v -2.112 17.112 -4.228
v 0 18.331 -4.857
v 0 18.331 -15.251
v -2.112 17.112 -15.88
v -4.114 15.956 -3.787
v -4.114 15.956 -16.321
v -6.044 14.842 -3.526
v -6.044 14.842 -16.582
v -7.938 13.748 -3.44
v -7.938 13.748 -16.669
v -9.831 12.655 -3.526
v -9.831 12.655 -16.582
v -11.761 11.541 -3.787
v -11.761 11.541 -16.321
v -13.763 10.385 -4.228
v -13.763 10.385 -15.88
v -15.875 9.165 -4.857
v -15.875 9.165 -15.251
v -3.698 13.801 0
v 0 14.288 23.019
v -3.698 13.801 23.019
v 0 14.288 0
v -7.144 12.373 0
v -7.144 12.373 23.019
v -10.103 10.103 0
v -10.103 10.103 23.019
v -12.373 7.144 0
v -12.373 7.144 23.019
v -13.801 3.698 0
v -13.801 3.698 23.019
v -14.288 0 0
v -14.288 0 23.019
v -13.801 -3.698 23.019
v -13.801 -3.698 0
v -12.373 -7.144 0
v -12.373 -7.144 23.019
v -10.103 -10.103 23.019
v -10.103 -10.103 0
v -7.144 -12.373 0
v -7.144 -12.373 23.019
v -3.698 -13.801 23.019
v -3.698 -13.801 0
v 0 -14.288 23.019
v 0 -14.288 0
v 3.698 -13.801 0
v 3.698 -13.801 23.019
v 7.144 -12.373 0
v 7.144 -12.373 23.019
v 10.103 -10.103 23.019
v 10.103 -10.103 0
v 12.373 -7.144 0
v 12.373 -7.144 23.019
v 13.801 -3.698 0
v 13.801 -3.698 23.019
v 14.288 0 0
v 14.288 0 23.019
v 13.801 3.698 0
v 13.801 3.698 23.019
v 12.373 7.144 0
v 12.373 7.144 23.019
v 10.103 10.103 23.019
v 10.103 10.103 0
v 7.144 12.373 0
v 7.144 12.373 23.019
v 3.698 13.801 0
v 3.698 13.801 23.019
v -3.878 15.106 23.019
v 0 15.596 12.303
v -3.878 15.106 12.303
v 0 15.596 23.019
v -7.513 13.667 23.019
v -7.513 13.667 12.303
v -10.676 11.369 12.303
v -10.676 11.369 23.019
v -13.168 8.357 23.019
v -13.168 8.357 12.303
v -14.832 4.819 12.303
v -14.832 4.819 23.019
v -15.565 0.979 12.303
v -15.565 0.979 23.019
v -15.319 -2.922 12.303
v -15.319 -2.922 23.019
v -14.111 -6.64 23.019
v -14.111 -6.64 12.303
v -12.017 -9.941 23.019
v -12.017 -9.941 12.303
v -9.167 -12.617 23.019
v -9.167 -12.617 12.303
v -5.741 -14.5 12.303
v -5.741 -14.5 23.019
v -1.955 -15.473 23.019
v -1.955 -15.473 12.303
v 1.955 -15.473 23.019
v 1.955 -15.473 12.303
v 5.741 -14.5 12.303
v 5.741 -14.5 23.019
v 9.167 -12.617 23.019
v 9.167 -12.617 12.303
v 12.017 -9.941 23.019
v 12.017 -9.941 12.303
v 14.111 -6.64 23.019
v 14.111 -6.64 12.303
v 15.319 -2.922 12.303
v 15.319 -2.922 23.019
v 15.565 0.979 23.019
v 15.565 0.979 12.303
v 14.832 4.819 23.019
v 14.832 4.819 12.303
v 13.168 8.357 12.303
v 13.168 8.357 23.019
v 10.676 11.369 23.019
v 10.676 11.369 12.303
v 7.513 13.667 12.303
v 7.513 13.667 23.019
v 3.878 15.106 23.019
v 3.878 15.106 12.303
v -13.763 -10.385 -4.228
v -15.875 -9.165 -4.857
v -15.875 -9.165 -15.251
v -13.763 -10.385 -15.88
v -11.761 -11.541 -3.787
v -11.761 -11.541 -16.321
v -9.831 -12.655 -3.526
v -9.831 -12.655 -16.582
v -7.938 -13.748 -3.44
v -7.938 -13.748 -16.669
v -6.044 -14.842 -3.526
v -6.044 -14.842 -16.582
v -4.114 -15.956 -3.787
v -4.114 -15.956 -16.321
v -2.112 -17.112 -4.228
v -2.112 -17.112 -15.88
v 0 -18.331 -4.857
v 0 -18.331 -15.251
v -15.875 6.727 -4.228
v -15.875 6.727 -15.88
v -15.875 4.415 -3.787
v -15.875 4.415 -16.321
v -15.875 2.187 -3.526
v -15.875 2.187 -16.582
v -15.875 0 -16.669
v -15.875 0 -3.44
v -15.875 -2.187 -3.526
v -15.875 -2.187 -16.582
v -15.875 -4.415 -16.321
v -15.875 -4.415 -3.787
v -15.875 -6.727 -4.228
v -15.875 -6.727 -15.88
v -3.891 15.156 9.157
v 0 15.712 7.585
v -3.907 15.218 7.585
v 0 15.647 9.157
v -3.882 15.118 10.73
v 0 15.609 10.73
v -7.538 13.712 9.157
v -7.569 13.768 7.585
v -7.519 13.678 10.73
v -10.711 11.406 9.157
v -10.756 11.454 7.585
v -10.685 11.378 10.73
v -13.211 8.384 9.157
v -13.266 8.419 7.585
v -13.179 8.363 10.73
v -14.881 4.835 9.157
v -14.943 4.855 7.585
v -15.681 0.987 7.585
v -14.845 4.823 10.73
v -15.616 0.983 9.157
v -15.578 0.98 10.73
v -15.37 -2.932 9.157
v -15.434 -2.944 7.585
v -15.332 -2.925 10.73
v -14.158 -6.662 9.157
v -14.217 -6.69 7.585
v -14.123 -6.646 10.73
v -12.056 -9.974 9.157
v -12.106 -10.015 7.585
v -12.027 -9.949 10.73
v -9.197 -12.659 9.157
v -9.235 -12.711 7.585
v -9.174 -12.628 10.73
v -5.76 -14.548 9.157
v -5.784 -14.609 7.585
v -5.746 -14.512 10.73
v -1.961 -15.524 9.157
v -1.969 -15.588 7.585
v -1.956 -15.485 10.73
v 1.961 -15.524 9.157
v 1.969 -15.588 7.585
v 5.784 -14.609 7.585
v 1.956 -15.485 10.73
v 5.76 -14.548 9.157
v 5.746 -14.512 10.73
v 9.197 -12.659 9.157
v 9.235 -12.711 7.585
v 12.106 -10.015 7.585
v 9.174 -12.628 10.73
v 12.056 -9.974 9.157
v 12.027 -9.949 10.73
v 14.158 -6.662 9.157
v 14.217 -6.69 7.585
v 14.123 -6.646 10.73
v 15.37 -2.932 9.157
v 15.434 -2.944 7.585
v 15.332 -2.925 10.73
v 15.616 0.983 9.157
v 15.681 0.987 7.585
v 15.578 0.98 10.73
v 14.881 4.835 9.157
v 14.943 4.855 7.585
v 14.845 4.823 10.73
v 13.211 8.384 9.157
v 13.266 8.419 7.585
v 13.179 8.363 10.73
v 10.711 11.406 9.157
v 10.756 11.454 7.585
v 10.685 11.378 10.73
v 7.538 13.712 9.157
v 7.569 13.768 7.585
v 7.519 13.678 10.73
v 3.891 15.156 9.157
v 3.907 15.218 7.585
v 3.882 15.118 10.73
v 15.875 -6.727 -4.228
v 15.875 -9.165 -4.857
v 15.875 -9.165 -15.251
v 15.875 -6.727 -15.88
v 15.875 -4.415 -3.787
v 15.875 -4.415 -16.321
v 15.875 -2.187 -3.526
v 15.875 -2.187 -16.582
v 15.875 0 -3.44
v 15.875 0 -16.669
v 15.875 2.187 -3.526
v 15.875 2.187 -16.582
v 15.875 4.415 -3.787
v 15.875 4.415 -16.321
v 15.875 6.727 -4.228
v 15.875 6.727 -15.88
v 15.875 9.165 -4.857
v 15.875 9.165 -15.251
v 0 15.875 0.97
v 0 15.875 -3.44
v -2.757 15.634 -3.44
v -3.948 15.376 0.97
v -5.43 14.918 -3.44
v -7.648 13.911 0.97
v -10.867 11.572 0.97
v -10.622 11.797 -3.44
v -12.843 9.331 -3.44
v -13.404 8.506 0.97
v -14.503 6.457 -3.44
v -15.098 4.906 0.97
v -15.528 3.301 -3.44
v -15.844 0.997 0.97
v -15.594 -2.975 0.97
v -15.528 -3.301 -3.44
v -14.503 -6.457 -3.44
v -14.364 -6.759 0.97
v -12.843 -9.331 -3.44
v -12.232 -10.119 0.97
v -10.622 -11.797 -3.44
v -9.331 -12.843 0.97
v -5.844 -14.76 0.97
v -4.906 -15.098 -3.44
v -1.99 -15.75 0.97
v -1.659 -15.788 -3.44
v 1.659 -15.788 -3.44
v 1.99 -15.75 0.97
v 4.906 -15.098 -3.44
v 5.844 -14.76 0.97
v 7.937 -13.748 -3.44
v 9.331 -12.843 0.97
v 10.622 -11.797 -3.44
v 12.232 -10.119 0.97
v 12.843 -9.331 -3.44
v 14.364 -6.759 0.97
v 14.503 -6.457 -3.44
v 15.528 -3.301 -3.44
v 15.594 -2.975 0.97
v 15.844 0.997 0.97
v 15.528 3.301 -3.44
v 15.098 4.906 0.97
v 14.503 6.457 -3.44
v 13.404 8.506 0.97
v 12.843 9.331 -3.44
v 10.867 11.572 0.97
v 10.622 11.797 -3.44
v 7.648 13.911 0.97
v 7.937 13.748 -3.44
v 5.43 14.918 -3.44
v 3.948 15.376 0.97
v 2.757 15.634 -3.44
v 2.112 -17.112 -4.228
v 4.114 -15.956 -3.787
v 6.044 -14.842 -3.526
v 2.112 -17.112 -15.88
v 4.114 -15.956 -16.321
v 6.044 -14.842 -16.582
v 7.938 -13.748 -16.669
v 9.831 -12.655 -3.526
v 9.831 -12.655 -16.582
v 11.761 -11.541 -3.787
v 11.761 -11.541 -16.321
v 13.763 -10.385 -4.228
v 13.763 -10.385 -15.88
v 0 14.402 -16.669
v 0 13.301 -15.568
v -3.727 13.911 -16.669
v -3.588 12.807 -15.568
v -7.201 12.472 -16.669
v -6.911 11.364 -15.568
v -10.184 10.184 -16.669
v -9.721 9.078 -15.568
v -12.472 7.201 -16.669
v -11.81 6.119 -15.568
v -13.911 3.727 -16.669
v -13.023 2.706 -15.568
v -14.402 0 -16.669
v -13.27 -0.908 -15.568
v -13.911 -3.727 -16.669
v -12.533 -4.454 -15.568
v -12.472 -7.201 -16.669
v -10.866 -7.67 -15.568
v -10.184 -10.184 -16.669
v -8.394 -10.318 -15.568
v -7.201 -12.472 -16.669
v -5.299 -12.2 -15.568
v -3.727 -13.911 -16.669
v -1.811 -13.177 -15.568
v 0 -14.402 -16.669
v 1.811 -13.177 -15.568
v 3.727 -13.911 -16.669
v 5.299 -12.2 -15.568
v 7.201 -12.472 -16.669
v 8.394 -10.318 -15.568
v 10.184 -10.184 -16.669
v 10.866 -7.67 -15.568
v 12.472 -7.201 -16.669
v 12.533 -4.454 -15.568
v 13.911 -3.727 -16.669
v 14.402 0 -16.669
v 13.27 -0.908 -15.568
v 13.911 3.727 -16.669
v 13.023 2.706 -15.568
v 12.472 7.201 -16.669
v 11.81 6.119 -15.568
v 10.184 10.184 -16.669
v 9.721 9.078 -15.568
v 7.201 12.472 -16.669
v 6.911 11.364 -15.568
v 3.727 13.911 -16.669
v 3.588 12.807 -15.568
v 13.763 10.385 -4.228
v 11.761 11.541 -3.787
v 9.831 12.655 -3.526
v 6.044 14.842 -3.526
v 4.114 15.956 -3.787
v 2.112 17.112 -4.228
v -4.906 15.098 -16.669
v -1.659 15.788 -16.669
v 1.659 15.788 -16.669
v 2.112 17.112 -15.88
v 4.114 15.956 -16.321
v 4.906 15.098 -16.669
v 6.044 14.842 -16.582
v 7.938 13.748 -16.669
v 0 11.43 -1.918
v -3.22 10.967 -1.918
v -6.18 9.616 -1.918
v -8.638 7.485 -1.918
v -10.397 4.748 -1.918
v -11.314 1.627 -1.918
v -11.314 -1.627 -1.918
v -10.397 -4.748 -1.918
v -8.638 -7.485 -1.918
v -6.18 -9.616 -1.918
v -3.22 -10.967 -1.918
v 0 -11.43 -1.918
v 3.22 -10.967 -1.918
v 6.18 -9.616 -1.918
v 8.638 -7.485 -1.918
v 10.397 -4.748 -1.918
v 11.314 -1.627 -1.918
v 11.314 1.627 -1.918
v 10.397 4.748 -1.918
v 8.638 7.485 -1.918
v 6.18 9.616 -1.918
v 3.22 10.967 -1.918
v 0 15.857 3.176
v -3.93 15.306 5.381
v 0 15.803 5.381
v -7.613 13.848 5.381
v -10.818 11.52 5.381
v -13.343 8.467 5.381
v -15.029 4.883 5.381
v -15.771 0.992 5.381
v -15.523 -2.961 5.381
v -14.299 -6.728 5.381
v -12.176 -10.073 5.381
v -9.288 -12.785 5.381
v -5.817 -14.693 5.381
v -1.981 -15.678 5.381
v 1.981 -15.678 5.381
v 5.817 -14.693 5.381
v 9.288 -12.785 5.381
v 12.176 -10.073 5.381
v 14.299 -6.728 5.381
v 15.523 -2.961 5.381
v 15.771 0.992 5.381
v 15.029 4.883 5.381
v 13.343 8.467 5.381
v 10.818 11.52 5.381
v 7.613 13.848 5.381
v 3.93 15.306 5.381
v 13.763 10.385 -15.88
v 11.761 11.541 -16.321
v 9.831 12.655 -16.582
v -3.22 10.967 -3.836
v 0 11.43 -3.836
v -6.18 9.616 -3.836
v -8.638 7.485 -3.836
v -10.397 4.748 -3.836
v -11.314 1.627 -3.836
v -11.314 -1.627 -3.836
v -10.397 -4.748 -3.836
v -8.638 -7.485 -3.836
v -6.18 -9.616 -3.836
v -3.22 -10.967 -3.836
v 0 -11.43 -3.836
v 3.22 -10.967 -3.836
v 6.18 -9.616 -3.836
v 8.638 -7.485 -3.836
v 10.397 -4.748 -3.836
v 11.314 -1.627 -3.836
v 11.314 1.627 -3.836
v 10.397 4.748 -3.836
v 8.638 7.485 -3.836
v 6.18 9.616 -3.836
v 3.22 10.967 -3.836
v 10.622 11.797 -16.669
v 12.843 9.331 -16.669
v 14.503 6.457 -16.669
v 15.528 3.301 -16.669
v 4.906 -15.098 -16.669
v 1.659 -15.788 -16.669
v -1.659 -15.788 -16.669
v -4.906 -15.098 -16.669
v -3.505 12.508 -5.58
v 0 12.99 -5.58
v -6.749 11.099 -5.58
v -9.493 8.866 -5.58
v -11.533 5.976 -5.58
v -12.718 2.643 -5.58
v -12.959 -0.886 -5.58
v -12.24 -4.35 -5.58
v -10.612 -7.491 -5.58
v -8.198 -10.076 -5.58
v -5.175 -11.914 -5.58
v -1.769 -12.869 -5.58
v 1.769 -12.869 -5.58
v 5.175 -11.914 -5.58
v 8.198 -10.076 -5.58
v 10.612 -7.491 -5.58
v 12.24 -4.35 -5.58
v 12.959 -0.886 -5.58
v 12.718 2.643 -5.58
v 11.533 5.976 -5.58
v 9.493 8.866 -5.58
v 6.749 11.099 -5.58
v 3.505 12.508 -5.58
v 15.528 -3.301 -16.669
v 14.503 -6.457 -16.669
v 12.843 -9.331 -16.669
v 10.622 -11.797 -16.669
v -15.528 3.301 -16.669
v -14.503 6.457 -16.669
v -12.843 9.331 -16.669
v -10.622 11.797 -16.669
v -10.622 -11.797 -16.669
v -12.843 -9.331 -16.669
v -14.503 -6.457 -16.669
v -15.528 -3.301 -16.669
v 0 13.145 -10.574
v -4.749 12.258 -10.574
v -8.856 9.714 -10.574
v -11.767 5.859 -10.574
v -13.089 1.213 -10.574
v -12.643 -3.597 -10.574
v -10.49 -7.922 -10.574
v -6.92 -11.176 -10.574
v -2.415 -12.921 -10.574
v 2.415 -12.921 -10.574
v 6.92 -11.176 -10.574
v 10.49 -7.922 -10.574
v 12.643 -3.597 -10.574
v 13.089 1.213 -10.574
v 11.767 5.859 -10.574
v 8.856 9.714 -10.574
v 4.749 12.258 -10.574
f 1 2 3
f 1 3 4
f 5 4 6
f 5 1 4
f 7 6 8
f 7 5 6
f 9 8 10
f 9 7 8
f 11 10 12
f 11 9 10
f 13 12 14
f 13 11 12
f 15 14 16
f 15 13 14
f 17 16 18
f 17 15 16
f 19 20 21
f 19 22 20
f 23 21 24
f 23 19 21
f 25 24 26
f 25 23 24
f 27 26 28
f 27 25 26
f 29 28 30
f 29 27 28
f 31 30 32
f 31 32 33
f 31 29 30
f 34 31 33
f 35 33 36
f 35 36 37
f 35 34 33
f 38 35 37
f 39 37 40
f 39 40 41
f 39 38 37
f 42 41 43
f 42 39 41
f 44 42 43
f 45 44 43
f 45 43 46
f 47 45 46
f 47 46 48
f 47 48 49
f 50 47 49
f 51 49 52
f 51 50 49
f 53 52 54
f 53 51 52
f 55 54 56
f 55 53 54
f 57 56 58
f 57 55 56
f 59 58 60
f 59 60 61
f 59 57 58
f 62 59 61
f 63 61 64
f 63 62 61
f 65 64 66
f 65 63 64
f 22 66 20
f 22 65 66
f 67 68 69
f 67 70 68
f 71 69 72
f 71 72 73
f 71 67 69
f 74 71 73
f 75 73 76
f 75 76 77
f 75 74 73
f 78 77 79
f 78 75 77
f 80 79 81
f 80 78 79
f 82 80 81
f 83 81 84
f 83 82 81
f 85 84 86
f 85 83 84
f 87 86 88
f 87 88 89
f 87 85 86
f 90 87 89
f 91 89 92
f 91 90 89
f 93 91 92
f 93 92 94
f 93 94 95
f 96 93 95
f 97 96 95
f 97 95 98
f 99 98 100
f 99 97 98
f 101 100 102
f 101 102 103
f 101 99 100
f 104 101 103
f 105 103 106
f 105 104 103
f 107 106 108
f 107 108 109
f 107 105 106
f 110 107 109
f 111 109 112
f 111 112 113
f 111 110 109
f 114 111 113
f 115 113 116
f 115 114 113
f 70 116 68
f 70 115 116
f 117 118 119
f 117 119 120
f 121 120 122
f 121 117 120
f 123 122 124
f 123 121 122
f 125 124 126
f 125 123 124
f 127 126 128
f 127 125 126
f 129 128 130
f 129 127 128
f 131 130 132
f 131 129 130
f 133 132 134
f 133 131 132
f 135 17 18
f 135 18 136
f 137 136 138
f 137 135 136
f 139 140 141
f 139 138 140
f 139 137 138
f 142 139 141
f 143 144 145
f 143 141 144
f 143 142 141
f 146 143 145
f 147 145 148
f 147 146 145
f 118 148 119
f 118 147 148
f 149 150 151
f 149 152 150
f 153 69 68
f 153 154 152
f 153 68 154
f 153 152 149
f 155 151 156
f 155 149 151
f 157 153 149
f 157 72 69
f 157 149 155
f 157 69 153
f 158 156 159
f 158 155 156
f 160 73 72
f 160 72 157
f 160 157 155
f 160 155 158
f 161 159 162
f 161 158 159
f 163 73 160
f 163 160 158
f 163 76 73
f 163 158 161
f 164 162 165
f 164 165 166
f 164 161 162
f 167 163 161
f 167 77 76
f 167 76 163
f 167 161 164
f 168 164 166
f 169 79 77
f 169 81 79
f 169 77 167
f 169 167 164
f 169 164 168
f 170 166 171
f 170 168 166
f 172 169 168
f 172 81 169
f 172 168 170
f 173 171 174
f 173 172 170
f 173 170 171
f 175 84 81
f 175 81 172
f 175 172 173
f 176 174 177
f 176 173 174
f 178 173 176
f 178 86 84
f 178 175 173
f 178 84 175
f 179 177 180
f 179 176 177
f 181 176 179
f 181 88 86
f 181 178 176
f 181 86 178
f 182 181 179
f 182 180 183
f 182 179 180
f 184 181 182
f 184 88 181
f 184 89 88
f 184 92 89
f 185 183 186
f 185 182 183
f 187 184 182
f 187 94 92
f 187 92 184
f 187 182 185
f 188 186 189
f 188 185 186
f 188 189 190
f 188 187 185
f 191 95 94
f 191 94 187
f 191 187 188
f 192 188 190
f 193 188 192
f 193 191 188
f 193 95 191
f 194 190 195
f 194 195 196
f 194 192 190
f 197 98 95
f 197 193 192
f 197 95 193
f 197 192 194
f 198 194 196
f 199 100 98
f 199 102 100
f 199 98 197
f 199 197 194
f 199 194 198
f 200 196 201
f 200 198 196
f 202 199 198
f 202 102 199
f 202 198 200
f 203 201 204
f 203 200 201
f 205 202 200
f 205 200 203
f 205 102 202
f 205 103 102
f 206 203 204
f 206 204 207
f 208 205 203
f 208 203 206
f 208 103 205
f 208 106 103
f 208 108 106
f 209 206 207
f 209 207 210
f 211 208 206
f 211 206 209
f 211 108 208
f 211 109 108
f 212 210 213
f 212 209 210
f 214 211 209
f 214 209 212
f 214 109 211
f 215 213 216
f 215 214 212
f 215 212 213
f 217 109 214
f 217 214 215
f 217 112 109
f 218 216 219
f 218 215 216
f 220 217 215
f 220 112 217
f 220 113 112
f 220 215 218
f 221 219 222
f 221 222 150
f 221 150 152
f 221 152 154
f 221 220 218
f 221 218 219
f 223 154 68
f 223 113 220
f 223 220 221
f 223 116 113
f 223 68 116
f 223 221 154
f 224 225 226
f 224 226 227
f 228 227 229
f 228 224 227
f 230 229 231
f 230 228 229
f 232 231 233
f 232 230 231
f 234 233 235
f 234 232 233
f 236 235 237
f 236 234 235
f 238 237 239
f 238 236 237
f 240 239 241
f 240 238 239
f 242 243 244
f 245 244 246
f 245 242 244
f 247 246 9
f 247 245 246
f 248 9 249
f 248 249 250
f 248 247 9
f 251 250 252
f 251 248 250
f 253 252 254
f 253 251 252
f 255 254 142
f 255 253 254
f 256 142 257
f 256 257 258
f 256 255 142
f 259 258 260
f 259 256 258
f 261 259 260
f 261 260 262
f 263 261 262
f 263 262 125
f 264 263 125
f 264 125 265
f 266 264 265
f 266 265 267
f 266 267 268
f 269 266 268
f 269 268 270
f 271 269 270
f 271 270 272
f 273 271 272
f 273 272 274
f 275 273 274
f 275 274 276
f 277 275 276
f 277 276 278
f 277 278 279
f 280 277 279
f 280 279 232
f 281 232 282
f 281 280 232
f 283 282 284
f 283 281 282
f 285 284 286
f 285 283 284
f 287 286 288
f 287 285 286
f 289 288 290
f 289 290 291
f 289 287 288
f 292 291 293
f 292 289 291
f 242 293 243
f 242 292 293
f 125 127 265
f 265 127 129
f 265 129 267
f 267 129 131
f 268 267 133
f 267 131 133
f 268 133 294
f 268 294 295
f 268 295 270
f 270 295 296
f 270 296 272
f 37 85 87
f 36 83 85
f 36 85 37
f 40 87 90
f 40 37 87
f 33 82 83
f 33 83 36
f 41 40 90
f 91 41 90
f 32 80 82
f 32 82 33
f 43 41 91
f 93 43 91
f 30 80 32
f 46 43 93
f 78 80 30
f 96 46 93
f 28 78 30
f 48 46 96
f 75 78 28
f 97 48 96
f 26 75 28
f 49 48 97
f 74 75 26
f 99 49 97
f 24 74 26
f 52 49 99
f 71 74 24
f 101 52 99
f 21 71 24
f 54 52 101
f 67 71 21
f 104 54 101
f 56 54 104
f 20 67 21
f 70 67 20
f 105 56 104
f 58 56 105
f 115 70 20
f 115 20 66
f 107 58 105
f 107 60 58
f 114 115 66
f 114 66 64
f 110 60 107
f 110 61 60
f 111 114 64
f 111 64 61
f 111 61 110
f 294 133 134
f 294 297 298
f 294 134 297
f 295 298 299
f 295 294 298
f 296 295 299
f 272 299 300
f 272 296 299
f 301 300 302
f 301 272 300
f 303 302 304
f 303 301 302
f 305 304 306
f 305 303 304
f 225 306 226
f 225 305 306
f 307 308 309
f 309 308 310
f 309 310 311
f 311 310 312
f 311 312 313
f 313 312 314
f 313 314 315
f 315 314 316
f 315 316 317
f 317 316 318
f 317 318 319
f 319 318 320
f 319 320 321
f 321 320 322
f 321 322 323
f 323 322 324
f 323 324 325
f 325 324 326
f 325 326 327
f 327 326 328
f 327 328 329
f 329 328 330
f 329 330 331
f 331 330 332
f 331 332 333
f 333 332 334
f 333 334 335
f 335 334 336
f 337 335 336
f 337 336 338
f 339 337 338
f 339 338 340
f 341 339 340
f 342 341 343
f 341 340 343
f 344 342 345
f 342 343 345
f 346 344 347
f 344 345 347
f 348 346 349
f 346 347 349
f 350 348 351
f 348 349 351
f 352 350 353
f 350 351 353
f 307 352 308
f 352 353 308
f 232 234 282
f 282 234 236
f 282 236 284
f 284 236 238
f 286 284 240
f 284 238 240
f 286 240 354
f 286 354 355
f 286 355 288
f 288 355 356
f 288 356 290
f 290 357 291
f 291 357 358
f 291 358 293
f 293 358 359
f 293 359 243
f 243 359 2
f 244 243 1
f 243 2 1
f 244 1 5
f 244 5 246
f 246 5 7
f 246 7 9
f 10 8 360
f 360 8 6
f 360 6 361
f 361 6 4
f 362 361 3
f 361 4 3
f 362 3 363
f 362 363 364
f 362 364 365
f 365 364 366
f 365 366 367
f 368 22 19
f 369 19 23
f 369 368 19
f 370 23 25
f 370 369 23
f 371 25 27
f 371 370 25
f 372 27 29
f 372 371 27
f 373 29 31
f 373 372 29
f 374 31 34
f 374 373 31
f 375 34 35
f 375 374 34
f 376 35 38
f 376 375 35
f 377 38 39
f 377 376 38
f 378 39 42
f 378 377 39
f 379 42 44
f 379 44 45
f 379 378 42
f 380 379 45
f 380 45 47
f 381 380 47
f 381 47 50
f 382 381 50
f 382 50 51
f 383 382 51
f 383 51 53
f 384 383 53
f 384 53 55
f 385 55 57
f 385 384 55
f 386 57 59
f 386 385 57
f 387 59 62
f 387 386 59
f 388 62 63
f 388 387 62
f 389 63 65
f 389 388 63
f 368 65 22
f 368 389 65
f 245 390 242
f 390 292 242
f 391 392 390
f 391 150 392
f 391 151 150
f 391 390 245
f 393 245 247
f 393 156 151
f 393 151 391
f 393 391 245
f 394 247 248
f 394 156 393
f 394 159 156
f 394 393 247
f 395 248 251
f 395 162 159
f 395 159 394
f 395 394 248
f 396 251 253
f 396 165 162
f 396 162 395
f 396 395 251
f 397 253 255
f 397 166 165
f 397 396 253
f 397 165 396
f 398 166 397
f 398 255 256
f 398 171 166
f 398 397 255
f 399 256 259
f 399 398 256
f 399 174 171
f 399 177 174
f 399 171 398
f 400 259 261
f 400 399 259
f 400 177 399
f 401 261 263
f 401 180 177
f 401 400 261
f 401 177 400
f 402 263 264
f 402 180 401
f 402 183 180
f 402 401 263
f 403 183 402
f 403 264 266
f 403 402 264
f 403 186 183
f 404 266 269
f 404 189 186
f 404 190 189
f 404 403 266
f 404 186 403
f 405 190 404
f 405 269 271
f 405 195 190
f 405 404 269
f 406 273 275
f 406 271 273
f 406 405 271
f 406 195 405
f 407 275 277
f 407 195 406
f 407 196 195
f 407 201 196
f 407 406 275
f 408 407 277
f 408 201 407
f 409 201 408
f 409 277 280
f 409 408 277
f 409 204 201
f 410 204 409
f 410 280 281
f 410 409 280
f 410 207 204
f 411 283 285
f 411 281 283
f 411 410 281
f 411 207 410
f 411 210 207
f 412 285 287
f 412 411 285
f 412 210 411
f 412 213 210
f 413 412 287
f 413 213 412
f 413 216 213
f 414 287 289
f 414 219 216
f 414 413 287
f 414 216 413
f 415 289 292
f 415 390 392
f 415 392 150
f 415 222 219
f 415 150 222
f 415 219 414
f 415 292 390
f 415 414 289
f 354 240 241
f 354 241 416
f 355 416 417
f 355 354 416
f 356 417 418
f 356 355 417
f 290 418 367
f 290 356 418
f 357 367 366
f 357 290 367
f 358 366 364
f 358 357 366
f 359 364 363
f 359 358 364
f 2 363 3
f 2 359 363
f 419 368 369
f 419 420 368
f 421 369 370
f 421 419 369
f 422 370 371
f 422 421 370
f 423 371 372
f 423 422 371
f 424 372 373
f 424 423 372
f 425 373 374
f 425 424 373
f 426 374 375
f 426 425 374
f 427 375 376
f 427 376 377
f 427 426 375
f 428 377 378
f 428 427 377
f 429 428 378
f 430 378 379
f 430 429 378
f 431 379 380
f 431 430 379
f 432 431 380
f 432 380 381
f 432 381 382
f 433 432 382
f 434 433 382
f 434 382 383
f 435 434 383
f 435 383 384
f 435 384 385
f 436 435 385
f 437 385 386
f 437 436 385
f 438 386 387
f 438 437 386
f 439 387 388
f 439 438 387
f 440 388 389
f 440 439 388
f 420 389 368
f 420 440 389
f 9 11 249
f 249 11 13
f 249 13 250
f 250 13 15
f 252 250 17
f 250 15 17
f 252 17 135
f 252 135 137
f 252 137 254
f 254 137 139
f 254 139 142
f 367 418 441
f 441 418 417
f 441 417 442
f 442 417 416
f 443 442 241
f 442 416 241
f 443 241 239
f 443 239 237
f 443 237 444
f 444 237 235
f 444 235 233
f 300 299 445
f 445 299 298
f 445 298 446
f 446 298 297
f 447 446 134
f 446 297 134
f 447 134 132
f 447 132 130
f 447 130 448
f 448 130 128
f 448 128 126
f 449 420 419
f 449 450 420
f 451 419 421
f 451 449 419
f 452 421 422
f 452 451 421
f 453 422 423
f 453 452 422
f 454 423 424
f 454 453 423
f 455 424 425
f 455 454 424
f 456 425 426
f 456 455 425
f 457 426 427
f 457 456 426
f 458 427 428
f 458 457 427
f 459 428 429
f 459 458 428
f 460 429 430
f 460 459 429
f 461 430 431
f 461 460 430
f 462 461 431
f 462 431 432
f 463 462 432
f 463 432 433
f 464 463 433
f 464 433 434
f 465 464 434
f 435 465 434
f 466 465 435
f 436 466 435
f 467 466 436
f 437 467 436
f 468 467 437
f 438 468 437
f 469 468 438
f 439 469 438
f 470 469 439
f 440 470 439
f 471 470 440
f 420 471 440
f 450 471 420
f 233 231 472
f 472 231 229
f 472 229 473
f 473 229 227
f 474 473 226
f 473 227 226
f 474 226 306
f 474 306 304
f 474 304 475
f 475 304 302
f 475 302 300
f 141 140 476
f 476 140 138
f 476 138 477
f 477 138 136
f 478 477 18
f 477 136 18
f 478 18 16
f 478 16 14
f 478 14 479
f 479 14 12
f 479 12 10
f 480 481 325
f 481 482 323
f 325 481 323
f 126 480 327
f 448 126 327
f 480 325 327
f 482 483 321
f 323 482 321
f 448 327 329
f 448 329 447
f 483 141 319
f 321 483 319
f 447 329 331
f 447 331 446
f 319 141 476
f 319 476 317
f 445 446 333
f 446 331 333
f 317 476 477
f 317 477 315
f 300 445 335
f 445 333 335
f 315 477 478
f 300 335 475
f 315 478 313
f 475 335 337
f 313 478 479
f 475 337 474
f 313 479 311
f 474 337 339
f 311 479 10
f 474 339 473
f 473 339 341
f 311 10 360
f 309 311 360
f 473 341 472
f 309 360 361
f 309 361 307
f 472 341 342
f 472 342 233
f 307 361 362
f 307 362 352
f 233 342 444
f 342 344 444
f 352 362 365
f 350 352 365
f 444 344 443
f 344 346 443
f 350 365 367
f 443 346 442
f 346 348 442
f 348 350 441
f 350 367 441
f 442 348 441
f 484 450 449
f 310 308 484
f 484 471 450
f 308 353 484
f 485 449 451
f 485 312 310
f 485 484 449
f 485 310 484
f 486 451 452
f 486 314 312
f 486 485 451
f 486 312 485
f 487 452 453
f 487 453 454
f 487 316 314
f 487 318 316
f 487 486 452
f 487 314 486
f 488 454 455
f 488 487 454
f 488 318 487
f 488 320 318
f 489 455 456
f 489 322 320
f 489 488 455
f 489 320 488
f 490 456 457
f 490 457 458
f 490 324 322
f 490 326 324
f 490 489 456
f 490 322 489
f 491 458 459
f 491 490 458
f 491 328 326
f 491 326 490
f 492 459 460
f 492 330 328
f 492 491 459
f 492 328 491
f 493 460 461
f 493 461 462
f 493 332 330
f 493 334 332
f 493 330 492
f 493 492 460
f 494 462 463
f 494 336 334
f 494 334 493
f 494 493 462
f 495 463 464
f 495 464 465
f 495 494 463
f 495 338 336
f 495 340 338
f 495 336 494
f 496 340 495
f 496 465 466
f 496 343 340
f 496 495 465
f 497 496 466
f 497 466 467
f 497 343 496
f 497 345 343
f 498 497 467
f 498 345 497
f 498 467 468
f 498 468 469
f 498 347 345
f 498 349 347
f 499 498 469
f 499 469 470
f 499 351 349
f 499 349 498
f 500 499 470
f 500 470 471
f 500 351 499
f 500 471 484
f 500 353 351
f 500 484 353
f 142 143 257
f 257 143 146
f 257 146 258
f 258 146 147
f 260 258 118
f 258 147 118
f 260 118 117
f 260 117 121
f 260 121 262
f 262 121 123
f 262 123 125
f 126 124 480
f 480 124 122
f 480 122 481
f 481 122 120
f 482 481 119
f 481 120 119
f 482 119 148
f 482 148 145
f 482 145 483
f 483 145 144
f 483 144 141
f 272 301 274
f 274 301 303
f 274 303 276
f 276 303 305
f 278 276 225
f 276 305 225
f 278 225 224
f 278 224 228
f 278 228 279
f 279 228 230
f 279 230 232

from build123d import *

# Parameters (mm, degrees)
BOSS_EXTRUDE1_DEPTH      = 23.01875
BOSS_EXTRUDE1_DEPTH_BACK = 16.66875
SKETCH8_OUTSIDE_W        = 7085.338
SKETCH8_OUTSIDE_H        = 7090.25
SKETCH8_OUTSIDE_R        = 15.875
CUT_EXTRUDE7_DEPTH       = 2032
CUT_EXTRUDE7_TAPER       = 60
SKETCH20_OUTSIDE_W       = 55.082
SKETCH20_OUTSIDE_H       = 59.994
SKETCH20_OUTSIDE_R       = 15.875
CUT_EXTRUDE9_DEPTH       = 2.54
CUT_EXTRUDE9_TAPER       = 60
CHAMFER1_SIZE2           = 1.101615862
CHAMFER1_SIZE            = 1.0668


with BuildPart() as part:
    # Sketch2 → Boss-Extrude1 (new body, two sides)
    with BuildSketch(Plane.XY) as boss_extrude1_sk:
        Polygon((0, 18.330871047), (-15.875, 9.165435523), (-15.875, -9.165435523), (0, -18.330871047), (15.875, -9.165435523), (15.875, 9.165435523), align=None)
    extrude(amount=BOSS_EXTRUDE1_DEPTH)
    extrude(boss_extrude1_sk.sketch, amount=-BOSS_EXTRUDE1_DEPTH_BACK)

    # Sketch5 → Cut-Revolve1 (revolve, cut)
    with BuildSketch(Plane(origin=(0, 0, 0), x_dir=(0, 0, -1), z_dir=(1, 0, 0))):
        Polygon((-23.01875, 0), (-23.01875, 14.2875), (0, 14.2875), (1.918229167, 11.43), (3.836458333, 11.43), (5.580126, 12.989754658), (16.66875, 13.335), (16.66875, 0), align=None)
    revolve(axis=Axis((0, 0, -16.66875), (0, 0, 1)), mode=Mode.SUBTRACT)

    # Sketch24 → Cut-Revolve2 (revolve, cut)
    with BuildSketch(Plane(origin=(0, 0, 0), x_dir=(0, 0, -1), z_dir=(1, 0, 0))):
        with BuildLine():
            Line((-23.01875, 15.5956), (-23.01875, 18.330871047))
            Line((-23.01875, 18.330871047), (3.439583333, 18.330871047))
            Line((3.439583333, 18.330871047), (3.439583333, 15.875))
            Line((3.439583333, 15.875), (-0.970138889, 15.875))
            ThreePointArc((-0.970138889, 15.875), (-4.278435497, 15.834225325), (-7.584722222, 15.71192607))
            ThreePointArc((-7.584722222, 15.71192607), (-9.943206753, 15.624685935), (-12.303125, 15.5956))
            Line((-12.303125, 15.5956), (-23.01875, 15.5956))
        make_face()
    revolve(axis=Axis((0, 0, 0), (0, 0, 1)), mode=Mode.SUBTRACT)

    # Sketch8 outside → Cut-Extrude7 (cut)
    with BuildSketch(Plane.XY.offset(-16.66875)):
        Rectangle(SKETCH8_OUTSIDE_W, SKETCH8_OUTSIDE_H)
        Circle(SKETCH8_OUTSIDE_R, mode=Mode.SUBTRACT)
    extrude(amount=CUT_EXTRUDE7_DEPTH, taper=CUT_EXTRUDE7_TAPER, mode=Mode.SUBTRACT)

    # Sketch20 outside → Cut-Extrude9 (cut)
    with BuildSketch(Plane(origin=(0, 0, -3.439583333), x_dir=(-1, 0, 0), z_dir=(0, 0, -1))):
        Rectangle(SKETCH20_OUTSIDE_W, SKETCH20_OUTSIDE_H)
        Circle(SKETCH20_OUTSIDE_R, mode=Mode.SUBTRACT)
    extrude(amount=CUT_EXTRUDE9_DEPTH, taper=CUT_EXTRUDE9_TAPER, mode=Mode.SUBTRACT)

    # Chamfer1
    chamfer1_edges = [part.edges().sort_by_distance(p)[0] for p in [
        (0, -13.335, -16.66875),
    ]]
    chamfer(chamfer1_edges, length=CHAMFER1_SIZE, length2=CHAMFER1_SIZE2)


solid = part.part
